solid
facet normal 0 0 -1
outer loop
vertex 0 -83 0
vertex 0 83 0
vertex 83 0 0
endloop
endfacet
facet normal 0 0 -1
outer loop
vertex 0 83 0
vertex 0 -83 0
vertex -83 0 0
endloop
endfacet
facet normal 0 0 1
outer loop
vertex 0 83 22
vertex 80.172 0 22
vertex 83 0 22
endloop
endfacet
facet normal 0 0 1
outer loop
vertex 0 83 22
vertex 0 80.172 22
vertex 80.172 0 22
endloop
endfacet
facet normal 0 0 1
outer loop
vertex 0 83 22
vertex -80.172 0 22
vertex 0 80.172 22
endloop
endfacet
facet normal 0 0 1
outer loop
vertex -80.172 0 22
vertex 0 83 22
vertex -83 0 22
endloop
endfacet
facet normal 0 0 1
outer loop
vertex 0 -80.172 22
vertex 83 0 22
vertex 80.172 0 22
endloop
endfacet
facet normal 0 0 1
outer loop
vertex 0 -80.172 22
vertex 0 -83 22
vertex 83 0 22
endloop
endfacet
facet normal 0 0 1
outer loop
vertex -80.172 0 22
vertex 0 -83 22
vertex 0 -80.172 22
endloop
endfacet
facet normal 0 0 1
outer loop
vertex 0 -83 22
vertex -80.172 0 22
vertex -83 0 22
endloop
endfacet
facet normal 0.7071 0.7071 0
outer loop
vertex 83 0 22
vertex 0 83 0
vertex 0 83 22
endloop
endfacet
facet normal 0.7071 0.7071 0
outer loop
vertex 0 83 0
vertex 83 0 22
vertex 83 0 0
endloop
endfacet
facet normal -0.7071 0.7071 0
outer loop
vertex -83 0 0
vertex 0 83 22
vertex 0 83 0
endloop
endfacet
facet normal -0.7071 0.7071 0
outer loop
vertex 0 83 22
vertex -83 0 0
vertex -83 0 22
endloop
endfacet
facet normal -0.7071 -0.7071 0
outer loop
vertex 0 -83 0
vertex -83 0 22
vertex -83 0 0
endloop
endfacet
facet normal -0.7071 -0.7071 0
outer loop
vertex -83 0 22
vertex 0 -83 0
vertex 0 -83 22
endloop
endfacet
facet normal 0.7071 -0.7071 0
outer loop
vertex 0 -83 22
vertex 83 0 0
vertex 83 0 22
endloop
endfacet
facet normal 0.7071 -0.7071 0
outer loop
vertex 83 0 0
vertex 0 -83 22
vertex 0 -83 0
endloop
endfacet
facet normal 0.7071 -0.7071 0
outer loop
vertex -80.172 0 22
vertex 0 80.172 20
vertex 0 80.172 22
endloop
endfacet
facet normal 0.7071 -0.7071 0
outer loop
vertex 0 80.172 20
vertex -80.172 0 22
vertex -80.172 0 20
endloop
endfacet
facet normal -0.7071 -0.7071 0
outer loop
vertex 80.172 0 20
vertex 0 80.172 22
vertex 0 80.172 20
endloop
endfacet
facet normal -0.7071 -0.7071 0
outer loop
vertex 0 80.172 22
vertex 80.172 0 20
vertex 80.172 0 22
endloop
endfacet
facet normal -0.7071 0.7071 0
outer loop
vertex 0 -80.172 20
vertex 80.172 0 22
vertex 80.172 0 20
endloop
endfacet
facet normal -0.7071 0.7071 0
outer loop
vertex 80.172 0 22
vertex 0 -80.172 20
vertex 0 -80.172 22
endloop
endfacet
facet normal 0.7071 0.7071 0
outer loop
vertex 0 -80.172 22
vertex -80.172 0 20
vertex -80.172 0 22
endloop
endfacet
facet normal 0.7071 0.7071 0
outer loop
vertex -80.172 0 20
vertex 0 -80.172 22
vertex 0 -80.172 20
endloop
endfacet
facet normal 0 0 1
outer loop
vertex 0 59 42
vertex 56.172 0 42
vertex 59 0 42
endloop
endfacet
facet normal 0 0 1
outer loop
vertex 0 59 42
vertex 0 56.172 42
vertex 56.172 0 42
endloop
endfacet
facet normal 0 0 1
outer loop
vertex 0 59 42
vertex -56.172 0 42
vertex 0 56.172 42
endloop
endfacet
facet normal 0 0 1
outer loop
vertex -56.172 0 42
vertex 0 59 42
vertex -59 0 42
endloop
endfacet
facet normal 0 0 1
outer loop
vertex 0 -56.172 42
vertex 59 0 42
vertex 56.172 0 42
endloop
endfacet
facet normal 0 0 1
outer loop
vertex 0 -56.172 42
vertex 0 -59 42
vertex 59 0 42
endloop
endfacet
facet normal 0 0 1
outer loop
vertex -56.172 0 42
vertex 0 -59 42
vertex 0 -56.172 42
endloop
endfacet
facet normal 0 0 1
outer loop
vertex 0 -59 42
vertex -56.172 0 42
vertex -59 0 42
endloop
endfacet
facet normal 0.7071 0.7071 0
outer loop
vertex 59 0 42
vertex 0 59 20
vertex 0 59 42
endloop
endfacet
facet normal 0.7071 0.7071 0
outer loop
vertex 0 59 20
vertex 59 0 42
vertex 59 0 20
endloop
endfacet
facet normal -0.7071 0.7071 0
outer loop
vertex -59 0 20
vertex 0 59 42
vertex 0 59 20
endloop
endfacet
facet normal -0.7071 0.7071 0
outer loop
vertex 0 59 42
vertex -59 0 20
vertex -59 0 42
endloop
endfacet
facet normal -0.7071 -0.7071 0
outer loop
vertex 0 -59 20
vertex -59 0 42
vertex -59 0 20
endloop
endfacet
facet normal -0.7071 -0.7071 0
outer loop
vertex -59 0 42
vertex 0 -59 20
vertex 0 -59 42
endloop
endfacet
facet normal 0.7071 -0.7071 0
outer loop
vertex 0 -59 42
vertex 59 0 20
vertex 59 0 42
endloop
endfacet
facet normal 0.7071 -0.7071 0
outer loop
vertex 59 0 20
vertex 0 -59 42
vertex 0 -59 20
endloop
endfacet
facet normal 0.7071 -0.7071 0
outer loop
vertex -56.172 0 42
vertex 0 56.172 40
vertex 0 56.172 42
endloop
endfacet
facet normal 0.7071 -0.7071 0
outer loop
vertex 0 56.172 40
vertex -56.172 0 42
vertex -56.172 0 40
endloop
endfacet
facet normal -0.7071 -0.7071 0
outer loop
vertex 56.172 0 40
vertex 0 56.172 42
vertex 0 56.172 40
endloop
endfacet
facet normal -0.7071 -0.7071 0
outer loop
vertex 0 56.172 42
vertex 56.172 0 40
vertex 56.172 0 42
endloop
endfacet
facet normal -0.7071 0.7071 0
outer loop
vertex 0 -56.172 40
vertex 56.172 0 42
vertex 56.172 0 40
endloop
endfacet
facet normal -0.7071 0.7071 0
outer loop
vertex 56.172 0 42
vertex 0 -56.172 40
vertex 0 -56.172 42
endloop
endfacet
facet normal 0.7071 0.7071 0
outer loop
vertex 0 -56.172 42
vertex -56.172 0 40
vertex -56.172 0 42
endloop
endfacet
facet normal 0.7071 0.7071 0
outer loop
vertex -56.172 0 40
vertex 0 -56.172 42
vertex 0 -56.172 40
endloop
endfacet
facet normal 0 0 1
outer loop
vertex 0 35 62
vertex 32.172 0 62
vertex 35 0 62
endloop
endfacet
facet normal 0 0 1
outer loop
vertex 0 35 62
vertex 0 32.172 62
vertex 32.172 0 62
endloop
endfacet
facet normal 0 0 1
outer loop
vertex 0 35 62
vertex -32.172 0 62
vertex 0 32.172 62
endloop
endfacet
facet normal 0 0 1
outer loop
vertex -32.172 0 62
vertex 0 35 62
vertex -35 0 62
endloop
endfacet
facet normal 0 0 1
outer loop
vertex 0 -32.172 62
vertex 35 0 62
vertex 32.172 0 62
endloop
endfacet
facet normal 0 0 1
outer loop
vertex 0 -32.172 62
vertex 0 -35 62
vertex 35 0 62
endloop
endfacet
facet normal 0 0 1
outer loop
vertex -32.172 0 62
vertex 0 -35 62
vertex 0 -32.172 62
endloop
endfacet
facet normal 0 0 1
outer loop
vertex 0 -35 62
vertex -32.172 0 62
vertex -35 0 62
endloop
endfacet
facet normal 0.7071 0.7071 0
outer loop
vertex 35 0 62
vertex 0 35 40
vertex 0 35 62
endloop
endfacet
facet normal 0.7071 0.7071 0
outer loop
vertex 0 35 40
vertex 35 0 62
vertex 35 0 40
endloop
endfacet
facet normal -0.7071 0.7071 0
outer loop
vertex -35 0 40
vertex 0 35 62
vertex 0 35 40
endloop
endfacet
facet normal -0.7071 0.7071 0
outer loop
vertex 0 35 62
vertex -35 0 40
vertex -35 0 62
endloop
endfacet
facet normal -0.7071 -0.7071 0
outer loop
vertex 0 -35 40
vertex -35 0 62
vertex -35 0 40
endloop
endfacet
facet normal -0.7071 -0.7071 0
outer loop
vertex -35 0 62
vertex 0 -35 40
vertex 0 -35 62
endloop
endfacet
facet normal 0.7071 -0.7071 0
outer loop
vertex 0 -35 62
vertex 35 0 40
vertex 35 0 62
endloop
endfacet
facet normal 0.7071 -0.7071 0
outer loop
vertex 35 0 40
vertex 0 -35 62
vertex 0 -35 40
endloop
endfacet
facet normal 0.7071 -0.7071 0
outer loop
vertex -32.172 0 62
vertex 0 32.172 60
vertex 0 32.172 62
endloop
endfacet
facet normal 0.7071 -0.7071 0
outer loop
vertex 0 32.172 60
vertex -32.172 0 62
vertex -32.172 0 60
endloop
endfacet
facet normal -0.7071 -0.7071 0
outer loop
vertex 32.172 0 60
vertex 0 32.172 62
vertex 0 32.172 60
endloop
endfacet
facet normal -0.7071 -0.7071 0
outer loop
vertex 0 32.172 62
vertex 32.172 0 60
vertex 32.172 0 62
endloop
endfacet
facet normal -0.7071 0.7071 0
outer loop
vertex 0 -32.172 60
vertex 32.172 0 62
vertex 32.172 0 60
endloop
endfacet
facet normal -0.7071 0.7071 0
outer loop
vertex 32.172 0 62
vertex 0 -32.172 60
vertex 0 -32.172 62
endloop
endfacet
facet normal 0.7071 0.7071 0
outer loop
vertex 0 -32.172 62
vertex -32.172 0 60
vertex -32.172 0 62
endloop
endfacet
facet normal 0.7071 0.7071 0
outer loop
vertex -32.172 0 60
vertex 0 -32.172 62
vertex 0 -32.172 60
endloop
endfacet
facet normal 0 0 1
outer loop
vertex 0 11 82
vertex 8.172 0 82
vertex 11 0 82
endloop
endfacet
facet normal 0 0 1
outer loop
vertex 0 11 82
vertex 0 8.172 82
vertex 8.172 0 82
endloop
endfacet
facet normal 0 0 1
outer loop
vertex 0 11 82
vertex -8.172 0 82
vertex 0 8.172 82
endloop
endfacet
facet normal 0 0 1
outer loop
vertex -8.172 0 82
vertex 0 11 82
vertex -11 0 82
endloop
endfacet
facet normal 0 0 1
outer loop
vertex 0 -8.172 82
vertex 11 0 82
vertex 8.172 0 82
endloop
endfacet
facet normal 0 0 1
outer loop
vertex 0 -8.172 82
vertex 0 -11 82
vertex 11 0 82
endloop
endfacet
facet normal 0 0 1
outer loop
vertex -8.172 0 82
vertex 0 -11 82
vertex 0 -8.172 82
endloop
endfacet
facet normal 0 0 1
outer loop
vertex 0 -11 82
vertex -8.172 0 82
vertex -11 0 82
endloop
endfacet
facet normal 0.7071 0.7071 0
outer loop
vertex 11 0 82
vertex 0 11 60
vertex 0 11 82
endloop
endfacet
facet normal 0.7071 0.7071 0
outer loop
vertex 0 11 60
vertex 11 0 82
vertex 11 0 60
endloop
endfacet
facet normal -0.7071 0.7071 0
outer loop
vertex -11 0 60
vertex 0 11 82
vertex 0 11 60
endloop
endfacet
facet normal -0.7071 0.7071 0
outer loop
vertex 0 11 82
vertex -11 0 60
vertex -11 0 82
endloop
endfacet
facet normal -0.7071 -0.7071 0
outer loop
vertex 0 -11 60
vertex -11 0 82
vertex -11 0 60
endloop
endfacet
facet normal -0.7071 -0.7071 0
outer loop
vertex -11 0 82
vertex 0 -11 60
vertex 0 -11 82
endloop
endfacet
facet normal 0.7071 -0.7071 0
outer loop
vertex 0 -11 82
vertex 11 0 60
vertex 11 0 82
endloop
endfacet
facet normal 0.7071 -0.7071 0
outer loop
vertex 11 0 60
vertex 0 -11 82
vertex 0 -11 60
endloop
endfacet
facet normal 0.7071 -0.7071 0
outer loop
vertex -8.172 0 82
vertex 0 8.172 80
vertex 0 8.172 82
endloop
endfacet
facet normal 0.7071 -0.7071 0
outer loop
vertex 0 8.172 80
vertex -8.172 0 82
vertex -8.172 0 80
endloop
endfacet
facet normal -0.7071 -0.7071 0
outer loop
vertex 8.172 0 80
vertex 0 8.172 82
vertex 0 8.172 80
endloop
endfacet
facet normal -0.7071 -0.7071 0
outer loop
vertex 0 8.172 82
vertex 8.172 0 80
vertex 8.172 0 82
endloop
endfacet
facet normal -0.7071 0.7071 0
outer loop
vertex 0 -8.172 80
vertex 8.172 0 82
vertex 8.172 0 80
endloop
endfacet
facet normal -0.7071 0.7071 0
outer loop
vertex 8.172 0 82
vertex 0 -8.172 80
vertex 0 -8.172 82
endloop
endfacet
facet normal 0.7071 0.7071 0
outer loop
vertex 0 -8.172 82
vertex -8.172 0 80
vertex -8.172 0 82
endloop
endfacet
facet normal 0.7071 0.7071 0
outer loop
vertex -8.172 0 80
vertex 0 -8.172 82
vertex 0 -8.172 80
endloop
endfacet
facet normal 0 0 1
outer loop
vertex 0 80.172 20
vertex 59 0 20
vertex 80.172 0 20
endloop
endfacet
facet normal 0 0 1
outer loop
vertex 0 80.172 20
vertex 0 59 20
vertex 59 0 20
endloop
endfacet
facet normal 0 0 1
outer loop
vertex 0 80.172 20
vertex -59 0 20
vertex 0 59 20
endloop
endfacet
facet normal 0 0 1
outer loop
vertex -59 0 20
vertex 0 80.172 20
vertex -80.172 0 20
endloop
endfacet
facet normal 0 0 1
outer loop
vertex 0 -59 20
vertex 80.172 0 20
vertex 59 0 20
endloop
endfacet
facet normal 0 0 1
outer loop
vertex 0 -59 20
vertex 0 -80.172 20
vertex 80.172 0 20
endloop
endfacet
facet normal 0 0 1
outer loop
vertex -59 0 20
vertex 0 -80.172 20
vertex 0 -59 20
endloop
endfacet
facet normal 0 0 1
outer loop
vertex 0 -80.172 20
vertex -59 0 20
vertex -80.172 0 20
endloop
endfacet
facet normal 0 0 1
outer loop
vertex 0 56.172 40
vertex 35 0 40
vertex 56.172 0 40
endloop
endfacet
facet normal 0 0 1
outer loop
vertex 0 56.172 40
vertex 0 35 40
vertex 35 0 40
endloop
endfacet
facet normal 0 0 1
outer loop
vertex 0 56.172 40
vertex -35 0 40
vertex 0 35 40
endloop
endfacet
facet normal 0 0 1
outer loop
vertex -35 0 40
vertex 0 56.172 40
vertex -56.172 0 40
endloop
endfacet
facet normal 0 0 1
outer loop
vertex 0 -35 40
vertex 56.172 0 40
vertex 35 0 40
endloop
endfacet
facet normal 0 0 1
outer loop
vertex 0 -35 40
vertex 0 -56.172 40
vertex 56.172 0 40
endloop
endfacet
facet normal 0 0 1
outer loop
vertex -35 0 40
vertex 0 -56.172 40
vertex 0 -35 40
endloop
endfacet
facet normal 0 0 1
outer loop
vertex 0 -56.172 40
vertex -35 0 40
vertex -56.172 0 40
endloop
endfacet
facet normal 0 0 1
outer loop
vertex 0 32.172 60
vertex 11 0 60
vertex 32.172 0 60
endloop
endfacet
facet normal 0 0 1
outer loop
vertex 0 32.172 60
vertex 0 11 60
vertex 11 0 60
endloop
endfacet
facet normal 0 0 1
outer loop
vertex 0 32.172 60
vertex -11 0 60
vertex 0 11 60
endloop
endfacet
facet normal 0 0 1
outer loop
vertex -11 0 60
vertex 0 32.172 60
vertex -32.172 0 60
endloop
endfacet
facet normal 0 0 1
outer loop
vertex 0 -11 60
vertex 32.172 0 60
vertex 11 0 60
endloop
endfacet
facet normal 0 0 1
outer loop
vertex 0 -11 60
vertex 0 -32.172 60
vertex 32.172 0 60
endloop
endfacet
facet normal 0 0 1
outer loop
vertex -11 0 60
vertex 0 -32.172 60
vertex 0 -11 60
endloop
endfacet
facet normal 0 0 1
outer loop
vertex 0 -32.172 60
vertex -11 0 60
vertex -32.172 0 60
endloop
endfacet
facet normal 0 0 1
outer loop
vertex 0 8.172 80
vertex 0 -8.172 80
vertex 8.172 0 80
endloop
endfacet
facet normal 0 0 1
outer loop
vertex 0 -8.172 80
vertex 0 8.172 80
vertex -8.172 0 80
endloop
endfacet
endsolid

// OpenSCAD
/*[global]*/
 
number_of_steps = 4; 
height_per_step =20;
//thickness/depth of each step (including fencing)
shelf_thickness = 24; 
top_diameter = 22;

//number of sides ( for circle set to <3)
number_of_sides = 4; 

/*[slice/partial model]*/
slice_model = 0; //[0: full, 1: half, 2: quarter]
angle_to_slice_model = 45;
//set to true to show the full top shelf
slice_offset = 0 ;  

/* [fencing] */
use_fencing =1; // [0:false, 1:true]
fence_thickness = 2;
fence_height = 2;

/*[star shape]*/
//create star shapes by rotating a secondary model
rotate_for_secondary_model =0;

if(slice_model == 1){
    
    diameter = number_of_steps * shelf_thickness+ top_diameter;  
    difference(){
        secondary_model();
         
        rotate(angle_to_slice_model){
            translate([ 0,slice_offset,0])
            cube([diameter, diameter, 
                height_per_step * number_of_steps+fence_height]);
         
            translate ([-diameter, slice_offset ,0])
            cube([diameter, diameter, 
                height_per_step * number_of_steps+fence_height]);
        } 
    }  
}else if (slice_model ==2){
    diameter = number_of_steps * shelf_thickness+ top_diameter;
     difference()
    {
        secondary_model();

        rotate(angle_to_slice_model){
            translate([ 0,slice_offset,0])
            cube([diameter, diameter, 
            height_per_step * number_of_steps+fence_height]);

            translate ([-diameter, slice_offset ,0])
            cube([diameter, diameter, 
            height_per_step * number_of_steps+fence_height]);
 
            translate ([ slice_offset,-diameter ,0])
            cube([diameter, diameter+slice_offset, 
            height_per_step * number_of_steps+fence_height]);
            }
       }
      
}else {
    secondary_model();
}

module secondary_model(){
    
    if(use_fencing){

        difference(){
            secondary_fencing(); 
            secondary_fencing_mask();
        }//difference
             
    } 
    
    model();
    rotate([0,0,rotate_for_secondary_model]) 
    model();  

}

module secondary_fencing(){
    fencing();
    rotate([0,0,rotate_for_secondary_model]) 
    fencing();
}


module secondary_fencing_mask(){
    fencing_mask();
    rotate([0,0,rotate_for_secondary_model]) 
    fencing_mask();
}

module model(){
    for(i=[1:number_of_steps]){
    current_step = i ;
    diameter_offset = (number_of_steps-current_step ) * 2 * shelf_thickness;
    diameter = diameter_offset + top_diameter;
         if(number_of_sides<3){
            cylinder(d=diameter, h  = current_step *height_per_step);
        }else {
            cylinder(d=diameter, h  = current_step *height_per_step, $fn=number_of_sides);
        } 
    }
}

module fencing_mask(){
    for(i=[1:number_of_steps]){
        current_step = i ;
        diameter_offset = (number_of_steps-current_step ) * 2 * shelf_thickness;
        diameter = diameter_offset + top_diameter;

        linear_extrude(height = current_step * height_per_step +fence_height)

        if(number_of_sides<3){ 
            offset(r=-fence_thickness)
            circle(d=diameter ); 
        }else{ 
            offset(r=-fence_thickness)
            circle(d=diameter, $fn = number_of_sides); 
        } 
    }//for each step
}

module fencing ( ){
     if(use_fencing){ 
            for(i=[1:number_of_steps]){
                current_step = i ;
                diameter_offset = (number_of_steps-current_step ) * 2 * shelf_thickness;
                diameter = diameter_offset + top_diameter;
                
            linear_extrude(height = current_step *height_per_step +fence_height)
            if(number_of_sides<3){
                difference(){
                circle(d=diameter );
                offset(r=-fence_thickness)
                circle(d=diameter );
                }
            }else{
                difference(){
                circle(d=diameter, $fn = number_of_sides);
                offset(r=-fence_thickness)
                circle(d=diameter, $fn = number_of_sides);
                }
            }
        }
    }
}
